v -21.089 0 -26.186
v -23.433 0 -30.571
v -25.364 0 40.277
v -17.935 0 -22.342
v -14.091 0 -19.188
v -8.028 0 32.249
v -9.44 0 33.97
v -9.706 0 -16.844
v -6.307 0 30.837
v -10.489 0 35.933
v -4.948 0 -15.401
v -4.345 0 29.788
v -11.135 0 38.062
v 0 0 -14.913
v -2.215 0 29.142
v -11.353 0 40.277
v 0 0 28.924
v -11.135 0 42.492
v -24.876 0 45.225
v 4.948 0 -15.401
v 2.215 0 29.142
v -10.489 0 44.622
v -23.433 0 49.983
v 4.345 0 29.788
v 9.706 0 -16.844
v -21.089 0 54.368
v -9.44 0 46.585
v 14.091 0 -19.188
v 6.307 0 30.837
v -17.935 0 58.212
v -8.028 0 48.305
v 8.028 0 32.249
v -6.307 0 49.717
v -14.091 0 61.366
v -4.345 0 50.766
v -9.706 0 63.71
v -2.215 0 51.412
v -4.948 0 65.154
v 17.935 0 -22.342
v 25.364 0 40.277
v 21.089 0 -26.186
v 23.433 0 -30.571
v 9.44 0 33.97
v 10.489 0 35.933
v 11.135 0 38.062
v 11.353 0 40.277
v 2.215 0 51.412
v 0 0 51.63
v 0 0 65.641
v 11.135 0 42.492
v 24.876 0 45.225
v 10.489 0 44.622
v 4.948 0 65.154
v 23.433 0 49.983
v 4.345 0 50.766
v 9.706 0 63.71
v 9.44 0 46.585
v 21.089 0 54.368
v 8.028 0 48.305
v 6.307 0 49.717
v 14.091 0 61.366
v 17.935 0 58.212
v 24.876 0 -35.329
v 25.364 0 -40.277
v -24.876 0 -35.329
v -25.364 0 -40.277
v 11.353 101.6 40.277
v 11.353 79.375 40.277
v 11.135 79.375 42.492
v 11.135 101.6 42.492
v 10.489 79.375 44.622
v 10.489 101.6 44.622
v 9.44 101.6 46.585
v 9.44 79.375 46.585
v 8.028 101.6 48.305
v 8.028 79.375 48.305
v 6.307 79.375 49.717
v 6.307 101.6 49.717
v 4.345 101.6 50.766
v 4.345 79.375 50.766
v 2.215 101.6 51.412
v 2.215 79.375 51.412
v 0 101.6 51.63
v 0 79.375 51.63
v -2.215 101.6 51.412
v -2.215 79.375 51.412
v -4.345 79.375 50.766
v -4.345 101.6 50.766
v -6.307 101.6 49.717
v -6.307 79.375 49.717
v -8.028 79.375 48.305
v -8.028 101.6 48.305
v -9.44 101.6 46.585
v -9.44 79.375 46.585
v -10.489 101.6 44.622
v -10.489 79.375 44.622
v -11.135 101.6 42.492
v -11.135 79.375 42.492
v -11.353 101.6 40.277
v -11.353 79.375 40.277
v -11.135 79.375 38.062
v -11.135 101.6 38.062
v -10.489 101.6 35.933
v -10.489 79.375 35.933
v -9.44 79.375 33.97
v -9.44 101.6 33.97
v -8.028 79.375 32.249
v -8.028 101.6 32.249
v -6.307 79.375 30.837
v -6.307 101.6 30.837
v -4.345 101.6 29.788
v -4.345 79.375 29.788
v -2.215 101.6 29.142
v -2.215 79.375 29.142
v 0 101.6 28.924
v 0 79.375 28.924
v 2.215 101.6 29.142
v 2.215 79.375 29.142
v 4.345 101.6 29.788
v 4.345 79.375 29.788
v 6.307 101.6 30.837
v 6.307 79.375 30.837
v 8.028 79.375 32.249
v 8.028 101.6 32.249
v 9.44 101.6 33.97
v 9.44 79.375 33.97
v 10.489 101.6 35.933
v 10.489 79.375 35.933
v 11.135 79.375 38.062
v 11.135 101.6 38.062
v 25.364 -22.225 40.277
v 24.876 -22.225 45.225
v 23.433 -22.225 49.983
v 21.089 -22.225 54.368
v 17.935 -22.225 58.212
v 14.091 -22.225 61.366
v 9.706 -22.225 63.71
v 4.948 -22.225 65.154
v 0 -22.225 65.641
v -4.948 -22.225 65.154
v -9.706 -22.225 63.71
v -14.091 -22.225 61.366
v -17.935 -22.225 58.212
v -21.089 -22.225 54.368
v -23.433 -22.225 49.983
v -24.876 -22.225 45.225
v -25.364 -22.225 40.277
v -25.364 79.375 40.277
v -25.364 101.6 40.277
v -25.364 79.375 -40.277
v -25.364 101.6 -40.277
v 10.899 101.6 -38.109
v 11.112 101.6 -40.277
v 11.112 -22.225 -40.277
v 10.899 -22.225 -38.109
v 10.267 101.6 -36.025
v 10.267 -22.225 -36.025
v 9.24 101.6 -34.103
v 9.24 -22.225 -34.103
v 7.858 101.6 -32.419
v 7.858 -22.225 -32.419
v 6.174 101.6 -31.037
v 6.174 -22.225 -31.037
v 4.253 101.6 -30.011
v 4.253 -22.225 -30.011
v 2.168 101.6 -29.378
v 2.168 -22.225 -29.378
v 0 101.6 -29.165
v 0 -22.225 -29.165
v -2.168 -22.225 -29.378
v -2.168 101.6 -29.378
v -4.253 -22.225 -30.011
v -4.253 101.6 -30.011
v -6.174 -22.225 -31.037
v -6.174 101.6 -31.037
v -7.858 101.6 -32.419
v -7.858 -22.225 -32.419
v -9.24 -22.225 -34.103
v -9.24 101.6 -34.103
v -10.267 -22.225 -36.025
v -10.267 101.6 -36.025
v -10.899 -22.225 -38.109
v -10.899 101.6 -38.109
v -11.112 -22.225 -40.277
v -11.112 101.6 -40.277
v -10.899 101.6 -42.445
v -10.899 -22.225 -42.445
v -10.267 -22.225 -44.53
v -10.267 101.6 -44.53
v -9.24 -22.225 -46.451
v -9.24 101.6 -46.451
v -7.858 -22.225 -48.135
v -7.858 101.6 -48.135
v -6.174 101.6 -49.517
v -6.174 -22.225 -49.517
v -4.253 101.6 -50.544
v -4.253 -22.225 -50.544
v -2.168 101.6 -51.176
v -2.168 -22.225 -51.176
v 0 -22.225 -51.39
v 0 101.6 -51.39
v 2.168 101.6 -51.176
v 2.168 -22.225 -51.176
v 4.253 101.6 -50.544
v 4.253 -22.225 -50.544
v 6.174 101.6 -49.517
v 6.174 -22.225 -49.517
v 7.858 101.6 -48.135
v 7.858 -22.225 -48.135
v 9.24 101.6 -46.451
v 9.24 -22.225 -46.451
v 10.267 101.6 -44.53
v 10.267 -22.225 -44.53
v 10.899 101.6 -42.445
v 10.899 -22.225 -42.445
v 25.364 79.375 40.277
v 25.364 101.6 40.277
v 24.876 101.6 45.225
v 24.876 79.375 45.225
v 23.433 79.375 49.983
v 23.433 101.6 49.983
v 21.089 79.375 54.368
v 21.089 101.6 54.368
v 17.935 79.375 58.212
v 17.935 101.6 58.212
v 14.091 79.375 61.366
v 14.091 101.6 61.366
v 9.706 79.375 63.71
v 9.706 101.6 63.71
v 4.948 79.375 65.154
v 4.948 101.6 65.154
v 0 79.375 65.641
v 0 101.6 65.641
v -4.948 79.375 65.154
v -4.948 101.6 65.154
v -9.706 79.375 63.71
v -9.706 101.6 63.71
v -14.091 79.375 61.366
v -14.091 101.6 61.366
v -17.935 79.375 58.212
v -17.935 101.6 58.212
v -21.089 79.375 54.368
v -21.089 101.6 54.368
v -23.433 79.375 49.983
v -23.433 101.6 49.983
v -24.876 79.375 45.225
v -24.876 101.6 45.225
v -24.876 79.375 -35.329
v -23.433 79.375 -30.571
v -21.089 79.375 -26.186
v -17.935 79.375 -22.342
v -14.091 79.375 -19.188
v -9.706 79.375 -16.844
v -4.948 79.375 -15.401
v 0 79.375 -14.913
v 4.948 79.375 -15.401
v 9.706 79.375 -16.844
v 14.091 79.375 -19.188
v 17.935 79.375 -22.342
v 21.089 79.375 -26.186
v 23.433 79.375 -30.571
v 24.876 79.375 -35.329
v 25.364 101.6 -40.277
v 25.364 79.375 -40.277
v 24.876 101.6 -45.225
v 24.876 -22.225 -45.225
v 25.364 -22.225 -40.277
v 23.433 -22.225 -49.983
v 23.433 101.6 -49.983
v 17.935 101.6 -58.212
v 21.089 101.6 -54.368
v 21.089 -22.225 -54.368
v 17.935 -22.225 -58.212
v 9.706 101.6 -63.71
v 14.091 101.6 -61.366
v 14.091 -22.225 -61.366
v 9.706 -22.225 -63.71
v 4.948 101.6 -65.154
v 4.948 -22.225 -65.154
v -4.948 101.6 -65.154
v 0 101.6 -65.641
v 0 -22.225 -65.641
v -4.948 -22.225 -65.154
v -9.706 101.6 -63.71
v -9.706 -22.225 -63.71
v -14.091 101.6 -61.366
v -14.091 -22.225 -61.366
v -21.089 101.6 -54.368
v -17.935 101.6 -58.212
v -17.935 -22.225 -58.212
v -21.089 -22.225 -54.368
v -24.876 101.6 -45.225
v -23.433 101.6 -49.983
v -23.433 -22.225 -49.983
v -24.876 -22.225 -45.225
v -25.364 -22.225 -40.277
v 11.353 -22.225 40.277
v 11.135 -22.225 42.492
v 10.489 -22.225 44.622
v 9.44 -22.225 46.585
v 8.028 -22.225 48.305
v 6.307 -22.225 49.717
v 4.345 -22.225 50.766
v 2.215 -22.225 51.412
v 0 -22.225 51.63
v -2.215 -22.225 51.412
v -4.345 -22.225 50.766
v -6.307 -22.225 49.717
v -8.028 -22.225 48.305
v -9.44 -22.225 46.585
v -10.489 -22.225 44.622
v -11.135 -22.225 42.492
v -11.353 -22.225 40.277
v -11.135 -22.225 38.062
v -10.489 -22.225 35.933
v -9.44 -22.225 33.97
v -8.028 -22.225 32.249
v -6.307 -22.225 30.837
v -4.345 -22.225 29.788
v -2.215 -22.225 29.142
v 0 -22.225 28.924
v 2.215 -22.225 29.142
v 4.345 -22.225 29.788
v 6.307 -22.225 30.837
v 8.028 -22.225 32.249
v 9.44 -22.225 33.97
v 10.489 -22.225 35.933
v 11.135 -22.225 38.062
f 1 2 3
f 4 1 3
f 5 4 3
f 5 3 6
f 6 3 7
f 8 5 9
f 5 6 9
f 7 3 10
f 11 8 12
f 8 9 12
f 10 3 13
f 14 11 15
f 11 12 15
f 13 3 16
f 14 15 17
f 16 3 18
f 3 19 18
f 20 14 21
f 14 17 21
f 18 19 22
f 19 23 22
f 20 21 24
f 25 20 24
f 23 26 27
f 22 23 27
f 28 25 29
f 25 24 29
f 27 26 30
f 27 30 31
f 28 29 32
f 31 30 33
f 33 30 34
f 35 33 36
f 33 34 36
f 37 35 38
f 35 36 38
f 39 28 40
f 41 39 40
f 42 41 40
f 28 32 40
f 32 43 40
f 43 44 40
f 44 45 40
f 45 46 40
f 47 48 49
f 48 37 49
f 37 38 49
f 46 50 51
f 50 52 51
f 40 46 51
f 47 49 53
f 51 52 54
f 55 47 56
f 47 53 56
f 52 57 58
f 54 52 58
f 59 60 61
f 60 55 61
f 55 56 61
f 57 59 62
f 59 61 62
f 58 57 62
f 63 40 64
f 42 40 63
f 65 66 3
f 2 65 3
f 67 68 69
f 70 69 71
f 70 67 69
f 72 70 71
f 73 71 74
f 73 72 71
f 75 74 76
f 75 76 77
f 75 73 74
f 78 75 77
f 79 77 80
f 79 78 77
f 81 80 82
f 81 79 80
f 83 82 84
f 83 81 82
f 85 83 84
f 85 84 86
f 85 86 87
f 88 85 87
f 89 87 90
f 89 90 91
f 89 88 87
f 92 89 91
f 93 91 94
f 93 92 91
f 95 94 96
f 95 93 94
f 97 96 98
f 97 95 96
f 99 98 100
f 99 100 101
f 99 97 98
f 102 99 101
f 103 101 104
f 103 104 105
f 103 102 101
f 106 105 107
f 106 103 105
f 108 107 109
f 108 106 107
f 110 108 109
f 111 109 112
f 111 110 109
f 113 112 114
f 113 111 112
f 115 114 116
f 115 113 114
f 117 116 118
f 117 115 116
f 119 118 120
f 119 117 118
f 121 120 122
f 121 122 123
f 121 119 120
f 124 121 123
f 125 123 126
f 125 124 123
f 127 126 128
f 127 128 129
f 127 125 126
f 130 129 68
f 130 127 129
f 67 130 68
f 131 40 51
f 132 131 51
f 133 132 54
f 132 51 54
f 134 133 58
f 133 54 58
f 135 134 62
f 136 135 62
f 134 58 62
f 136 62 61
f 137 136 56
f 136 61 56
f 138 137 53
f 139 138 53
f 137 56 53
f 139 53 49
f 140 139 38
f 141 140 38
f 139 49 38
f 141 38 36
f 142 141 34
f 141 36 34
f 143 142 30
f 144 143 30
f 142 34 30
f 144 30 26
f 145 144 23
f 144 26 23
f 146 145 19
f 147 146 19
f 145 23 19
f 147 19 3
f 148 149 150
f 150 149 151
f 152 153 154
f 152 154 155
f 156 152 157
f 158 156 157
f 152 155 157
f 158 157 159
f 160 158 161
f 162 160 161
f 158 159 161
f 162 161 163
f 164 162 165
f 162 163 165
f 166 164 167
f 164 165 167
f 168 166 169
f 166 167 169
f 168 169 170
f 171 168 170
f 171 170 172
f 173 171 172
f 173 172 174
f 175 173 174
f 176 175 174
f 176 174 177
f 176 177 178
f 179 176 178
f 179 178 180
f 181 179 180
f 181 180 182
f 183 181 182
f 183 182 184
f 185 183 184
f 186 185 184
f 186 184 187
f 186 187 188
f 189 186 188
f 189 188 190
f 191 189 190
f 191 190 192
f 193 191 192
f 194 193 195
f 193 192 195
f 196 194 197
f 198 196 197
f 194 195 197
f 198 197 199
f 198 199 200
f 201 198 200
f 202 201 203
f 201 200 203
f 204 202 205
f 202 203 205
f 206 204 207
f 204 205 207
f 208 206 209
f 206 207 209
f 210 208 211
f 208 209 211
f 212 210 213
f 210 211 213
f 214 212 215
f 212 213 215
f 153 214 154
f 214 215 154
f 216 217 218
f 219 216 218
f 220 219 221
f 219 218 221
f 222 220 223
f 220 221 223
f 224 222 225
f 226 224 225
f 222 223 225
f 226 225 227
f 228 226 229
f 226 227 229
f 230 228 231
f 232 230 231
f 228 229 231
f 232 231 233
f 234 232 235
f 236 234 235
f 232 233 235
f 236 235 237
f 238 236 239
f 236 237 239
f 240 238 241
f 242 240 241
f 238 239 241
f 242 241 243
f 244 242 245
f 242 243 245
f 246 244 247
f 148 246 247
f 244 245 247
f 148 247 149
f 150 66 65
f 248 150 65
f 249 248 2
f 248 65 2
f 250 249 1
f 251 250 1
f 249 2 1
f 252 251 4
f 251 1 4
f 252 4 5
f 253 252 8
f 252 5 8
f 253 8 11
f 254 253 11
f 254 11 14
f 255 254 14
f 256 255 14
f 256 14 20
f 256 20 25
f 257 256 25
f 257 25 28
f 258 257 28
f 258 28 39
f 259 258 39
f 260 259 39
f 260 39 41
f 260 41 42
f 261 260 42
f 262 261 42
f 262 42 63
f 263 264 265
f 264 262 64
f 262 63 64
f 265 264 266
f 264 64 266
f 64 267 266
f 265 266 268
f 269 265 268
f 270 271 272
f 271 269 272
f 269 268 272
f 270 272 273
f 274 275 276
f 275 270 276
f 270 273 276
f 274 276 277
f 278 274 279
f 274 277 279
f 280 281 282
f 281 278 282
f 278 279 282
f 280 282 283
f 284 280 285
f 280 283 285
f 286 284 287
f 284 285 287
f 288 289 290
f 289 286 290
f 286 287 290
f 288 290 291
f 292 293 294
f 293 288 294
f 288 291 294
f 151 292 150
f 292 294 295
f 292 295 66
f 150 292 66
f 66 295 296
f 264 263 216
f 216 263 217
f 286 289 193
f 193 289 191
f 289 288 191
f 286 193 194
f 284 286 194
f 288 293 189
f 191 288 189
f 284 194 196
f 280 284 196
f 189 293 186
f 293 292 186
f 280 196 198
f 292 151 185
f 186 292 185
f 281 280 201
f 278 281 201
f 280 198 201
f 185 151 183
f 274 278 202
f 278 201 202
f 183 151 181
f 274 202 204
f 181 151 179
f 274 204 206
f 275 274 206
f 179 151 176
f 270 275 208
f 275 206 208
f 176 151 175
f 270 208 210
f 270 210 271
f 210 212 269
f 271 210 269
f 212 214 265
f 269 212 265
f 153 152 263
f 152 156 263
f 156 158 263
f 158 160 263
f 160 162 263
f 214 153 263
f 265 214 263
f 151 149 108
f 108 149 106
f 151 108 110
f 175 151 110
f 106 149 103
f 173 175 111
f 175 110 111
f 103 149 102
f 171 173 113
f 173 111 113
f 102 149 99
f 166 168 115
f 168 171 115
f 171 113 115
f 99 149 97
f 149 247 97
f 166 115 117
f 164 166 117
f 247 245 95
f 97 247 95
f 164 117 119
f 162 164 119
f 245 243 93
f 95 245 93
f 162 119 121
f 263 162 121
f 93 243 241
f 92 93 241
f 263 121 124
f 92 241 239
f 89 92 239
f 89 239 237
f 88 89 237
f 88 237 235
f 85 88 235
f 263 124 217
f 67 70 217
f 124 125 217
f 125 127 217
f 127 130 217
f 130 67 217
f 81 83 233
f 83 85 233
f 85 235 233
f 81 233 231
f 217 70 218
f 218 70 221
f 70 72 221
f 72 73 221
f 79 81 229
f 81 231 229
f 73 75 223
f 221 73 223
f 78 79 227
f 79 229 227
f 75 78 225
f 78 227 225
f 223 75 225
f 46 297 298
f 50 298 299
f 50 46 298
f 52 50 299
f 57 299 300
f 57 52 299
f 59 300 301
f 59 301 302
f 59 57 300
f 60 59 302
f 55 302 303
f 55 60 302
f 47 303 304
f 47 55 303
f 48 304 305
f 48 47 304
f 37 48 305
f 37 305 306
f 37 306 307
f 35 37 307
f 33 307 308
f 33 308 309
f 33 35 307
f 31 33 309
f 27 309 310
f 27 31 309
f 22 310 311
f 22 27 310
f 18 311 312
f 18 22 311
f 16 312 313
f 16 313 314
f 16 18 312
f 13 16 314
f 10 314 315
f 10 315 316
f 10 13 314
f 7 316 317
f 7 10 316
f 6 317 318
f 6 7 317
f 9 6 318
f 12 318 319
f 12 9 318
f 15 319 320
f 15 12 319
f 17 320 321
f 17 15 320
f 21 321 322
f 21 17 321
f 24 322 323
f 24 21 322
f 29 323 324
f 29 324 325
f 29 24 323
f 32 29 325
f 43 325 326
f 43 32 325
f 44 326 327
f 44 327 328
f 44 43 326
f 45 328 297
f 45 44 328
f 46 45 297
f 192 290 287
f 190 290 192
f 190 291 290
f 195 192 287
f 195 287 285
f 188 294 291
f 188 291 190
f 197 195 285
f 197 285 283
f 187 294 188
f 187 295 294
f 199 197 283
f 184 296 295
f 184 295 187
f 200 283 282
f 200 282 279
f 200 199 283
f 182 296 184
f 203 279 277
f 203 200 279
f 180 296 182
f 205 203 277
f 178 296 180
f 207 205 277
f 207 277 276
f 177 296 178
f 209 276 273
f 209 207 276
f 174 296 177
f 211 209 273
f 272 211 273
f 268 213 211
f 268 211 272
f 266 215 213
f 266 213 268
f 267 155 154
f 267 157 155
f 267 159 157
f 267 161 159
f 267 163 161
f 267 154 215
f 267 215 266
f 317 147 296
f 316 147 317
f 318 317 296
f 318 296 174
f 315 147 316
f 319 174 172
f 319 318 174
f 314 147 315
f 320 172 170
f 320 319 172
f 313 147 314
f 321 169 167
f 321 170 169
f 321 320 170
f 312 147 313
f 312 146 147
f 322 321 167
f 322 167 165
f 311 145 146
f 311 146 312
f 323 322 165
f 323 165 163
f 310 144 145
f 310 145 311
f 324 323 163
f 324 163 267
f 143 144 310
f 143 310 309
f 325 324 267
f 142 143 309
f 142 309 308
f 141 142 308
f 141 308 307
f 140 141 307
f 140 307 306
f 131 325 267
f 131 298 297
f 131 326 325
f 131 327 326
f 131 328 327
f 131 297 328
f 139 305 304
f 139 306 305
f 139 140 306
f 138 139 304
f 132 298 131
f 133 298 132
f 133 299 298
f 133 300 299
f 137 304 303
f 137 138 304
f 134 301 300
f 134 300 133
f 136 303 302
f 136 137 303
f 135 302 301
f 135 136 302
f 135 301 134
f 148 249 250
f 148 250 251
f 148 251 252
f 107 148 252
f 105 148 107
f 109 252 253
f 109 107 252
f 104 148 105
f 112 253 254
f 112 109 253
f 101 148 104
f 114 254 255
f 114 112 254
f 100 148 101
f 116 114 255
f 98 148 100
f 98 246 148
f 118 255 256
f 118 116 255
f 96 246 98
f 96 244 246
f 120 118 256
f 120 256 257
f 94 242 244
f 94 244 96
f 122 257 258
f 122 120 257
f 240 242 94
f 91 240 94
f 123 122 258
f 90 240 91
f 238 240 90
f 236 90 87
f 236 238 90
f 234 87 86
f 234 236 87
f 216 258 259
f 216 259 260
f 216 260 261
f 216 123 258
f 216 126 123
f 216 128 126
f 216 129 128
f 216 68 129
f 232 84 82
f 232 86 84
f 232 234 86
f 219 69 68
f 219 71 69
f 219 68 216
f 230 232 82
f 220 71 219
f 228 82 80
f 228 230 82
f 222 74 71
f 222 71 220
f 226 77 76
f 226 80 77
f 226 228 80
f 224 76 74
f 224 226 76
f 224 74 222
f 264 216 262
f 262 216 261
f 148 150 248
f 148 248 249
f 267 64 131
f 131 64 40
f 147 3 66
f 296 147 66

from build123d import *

# Parameters (mm, degrees)
F0_R     = 11.3530222264
F1_DEPTH = 22.225
F4_DEPTH = 79.375
F6_D     = 22.225


with BuildPart() as f1:
    # F0 (on Front) → F1 (new body)
    with BuildSketch(Plane.XZ):
        with BuildLine():
            Line((25.3637172282, -40.2771420777), (25.3637172282, 40.2771420777))
            ThreePointArc((25.3637172282, 40.2771420777), (0, 65.6408593059), (-25.3637172282, 40.2771420777))
            Line((-25.3637172282, 40.2771420777), (-25.3637172282, -40.2771420777))
            ThreePointArc((-25.3637172282, -40.2771420777), (0, -65.6408593059), (25.3637172282, -40.2771420777))
        make_face()
        with Locations((0, 40.2771420777)):
            Circle(F0_R, mode=Mode.SUBTRACT)
    extrude(amount=F1_DEPTH)


with BuildPart() as f2_1:
    # F2: copy of F1
    add(f1.part.moved(Location((0, 101.6, 0))))


with BuildPart() as f1_1:
    add(f1.part)

    add(f2_1.part)  # F4 merges F2_1
    # F3 (on face) → F4 (join, through all)
    with BuildSketch(Plane(origin=(0, 0, 0), x_dir=(-1, 0, 0), z_dir=(0, 1, 0))):
        with BuildLine():
            ThreePointArc((-25.3637172282, -40.2771420777), (0, -65.6408593059), (25.3637172282, -40.2771420777))
            ThreePointArc((25.3637172282, -40.2771420777), (0, -14.9134248495), (-25.3637172282, -40.2771420777))
        make_face()
    extrude(amount=F4_DEPTH)

    # F6 (through all)
    with Locations(Plane(origin=(0, 101.6, 0), x_dir=(-1, 0, 0), z_dir=(0, 1, 0))):
        with Locations((0, -40.2771420777)):
            Hole(F6_D / 2)


solid = f1_1.part
